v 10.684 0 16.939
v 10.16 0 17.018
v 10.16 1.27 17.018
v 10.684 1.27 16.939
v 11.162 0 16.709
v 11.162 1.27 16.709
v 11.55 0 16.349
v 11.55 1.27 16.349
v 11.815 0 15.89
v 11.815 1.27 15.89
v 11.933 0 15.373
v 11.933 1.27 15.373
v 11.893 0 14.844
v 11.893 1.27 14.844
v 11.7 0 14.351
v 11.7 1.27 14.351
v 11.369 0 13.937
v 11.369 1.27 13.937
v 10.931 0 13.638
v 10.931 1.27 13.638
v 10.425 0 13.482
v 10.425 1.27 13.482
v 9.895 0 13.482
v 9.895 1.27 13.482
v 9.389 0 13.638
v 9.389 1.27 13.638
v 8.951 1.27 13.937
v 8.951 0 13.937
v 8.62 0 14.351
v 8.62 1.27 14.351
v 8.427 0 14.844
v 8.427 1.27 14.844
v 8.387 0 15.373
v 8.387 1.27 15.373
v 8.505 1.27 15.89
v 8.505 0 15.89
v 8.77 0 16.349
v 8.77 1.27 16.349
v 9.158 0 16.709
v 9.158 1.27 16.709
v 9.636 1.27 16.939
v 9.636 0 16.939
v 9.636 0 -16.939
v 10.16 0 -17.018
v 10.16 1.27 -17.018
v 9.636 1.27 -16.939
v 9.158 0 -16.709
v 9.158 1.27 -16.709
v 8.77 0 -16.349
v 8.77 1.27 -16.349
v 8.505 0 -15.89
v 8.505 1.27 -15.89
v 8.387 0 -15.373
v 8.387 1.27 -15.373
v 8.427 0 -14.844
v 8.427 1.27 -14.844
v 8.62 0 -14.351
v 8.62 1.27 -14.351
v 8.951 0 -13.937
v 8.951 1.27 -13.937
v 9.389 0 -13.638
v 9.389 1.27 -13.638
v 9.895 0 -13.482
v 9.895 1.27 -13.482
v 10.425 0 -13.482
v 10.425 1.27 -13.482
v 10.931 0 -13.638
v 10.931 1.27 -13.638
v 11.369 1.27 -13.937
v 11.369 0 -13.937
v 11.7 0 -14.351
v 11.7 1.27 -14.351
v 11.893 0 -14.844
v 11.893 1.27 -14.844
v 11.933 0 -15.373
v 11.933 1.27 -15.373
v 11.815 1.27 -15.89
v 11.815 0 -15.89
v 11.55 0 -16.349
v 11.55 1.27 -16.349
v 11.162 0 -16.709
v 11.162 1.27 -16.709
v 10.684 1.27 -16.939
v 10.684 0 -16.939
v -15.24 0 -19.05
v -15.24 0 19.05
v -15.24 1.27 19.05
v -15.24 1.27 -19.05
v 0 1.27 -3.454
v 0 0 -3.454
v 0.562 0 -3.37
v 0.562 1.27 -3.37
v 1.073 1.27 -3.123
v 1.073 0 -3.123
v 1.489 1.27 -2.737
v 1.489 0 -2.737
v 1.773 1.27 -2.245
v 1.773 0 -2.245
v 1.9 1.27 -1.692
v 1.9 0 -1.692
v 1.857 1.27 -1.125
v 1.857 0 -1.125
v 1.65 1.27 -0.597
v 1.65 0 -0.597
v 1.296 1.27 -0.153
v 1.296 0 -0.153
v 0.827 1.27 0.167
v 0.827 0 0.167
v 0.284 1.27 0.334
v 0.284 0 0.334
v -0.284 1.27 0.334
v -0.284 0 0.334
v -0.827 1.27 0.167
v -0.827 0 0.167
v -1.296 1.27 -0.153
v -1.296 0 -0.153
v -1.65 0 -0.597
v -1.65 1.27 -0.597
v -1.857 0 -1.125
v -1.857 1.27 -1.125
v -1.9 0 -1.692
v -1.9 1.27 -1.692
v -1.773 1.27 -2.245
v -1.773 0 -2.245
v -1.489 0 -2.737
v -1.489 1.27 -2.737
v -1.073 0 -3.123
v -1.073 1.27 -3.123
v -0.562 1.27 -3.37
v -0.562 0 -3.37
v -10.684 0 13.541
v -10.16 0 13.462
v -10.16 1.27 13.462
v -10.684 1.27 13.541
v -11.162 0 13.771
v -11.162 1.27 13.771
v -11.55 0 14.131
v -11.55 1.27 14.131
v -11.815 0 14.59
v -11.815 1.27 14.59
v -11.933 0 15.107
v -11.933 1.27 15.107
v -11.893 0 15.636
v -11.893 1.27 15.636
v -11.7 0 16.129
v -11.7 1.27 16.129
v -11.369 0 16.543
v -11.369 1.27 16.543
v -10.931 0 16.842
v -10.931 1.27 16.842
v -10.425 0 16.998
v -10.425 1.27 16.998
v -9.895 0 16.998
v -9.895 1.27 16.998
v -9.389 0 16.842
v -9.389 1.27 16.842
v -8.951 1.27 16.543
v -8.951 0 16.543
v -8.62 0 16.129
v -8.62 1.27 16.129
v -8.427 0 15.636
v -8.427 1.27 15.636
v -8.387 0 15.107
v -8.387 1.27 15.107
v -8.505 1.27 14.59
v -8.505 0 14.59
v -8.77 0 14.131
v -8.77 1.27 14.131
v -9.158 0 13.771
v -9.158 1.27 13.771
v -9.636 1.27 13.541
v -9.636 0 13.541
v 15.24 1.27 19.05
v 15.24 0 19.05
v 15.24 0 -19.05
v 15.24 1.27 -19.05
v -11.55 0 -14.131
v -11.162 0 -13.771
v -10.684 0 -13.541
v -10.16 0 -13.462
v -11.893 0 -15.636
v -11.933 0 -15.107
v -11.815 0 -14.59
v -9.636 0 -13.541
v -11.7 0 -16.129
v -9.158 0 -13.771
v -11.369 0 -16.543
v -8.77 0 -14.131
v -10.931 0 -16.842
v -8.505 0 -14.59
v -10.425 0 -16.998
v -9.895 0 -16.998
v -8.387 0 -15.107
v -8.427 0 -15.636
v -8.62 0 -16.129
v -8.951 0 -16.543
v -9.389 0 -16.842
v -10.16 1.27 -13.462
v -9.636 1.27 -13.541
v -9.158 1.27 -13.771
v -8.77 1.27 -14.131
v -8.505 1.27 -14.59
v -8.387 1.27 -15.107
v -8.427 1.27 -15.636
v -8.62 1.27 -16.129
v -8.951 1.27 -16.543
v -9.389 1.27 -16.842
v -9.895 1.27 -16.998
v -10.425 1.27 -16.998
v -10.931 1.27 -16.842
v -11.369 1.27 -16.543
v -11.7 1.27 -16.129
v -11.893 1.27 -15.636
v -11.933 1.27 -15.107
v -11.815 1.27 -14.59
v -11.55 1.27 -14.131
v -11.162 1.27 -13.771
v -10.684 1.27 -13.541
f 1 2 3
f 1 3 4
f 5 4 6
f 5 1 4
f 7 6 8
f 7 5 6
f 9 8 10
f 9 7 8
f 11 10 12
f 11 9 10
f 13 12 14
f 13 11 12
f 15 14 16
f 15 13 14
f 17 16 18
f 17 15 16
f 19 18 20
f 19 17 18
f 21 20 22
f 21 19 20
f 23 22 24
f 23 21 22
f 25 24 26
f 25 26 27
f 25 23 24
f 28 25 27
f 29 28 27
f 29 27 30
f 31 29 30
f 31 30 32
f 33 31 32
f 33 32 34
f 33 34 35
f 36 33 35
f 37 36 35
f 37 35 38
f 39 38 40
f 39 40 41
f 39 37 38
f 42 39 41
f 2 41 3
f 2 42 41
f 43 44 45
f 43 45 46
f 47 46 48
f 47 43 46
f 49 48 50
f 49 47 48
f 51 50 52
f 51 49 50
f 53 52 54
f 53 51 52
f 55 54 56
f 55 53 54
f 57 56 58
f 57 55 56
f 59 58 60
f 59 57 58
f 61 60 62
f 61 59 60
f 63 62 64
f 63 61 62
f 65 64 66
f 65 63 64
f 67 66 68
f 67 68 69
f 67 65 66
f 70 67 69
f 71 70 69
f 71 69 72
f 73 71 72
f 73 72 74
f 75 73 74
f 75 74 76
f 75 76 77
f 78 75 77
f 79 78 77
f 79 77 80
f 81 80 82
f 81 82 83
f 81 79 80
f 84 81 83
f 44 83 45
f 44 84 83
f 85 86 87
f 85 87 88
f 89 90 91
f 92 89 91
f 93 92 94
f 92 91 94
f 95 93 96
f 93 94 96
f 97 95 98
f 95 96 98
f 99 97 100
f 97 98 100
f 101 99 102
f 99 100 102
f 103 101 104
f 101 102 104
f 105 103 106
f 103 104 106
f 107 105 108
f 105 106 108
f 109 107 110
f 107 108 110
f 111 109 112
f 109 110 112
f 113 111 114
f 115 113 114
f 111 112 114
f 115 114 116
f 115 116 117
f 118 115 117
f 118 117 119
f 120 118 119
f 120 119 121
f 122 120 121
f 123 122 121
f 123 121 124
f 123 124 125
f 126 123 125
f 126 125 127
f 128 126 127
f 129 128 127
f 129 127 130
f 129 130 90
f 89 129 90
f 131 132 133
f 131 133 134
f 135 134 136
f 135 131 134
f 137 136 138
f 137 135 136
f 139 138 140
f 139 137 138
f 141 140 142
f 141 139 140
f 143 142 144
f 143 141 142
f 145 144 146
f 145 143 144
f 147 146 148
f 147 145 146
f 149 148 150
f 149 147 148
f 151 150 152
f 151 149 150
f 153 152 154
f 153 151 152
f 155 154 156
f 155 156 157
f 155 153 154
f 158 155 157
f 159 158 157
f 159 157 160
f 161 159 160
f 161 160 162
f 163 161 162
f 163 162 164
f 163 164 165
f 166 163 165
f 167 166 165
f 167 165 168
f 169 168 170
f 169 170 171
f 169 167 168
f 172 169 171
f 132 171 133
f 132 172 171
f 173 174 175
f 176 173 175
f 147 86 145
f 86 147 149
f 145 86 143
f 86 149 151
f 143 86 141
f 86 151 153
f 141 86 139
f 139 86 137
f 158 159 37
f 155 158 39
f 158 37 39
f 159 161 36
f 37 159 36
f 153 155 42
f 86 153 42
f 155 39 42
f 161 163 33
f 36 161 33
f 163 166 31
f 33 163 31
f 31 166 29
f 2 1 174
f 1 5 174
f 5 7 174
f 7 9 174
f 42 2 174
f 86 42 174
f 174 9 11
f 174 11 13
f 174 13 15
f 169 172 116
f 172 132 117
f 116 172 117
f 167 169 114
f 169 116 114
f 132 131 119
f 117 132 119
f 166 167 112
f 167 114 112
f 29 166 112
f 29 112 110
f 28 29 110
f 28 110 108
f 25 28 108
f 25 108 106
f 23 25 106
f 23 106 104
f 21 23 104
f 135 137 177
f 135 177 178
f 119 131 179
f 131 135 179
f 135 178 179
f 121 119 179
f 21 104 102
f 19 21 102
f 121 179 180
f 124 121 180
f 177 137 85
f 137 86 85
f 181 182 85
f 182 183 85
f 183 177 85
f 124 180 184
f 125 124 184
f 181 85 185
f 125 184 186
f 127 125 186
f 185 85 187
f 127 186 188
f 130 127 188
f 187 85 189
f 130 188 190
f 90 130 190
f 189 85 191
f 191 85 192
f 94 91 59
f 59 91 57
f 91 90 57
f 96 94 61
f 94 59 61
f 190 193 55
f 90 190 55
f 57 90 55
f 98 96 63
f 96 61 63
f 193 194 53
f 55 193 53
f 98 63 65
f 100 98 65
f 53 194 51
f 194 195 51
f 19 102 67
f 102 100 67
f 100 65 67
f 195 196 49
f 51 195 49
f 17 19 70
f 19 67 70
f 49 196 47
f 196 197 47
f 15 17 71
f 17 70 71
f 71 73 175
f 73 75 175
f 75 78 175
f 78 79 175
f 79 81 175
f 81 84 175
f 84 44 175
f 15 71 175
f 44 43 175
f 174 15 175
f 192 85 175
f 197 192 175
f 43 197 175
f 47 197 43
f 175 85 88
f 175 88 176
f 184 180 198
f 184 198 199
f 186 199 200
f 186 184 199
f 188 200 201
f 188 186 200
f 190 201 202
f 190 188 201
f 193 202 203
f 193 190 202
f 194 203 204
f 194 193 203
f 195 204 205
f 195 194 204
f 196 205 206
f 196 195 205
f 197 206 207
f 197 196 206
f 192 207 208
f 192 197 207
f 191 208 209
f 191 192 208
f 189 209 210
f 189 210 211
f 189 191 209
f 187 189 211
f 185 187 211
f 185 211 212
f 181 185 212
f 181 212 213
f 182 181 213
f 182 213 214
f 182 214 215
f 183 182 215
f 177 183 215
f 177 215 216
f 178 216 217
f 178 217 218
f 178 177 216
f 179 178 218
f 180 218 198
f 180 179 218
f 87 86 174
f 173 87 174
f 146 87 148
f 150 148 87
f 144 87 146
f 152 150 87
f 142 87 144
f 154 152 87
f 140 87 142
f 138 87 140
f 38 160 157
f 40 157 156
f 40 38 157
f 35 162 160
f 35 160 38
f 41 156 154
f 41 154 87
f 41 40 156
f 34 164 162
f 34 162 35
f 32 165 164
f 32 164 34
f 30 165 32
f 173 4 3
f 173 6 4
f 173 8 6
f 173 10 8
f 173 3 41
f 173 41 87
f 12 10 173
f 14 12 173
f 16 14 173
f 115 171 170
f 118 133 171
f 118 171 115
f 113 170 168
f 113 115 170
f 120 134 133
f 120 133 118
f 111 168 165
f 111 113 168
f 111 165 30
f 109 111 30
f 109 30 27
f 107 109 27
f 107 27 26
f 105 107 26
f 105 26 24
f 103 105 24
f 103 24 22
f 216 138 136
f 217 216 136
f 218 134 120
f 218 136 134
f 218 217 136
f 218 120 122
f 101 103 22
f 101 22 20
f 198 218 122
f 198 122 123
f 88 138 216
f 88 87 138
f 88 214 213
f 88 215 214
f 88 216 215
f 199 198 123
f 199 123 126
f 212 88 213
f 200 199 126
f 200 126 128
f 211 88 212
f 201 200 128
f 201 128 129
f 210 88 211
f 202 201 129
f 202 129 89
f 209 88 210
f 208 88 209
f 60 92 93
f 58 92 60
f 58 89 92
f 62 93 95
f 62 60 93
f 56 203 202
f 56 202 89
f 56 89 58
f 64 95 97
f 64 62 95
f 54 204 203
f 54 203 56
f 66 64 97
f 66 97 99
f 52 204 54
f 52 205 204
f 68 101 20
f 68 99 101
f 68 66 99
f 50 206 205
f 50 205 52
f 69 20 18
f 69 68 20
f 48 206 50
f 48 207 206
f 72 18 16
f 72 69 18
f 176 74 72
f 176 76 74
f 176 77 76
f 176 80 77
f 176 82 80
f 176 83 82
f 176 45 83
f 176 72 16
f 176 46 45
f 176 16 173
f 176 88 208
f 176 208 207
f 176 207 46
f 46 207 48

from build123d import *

# Parameters (mm, degrees)
SKETCH1_W           = 30.48
SKETCH1_H           = 38.1
SKETCH1_R           = 1.778
BOSS_EXTRUDE1_DEPTH = 1.27
SKETCH2_R           = 1.778
SKETCH2_R_2         = 1.905
CUT_EXTRUDE1_DEPTH  = 25.428937758


with BuildPart() as part:
    # Sketch1 → Boss-Extrude1 (new body)
    with BuildSketch(Plane(origin=(0, 0, 0), x_dir=(1, 0, 0), z_dir=(0, 1, 0))):
        Rectangle(SKETCH1_W, SKETCH1_H)
        with Locations(Location((-10.16, 15.24, 0), (0, 0, 270))):
            Circle(SKETCH1_R, mode=Mode.SUBTRACT)
        with Locations(Location((10.16, 15.24, 0), (0, 0, 90))):
            Circle(SKETCH1_R, mode=Mode.SUBTRACT)
        with Locations(Location((-10.16, -15.24, 0), (0, 0, 90))):
            Circle(SKETCH1_R, mode=Mode.SUBTRACT)
        with Locations(Location((10.16, -15.24, 0), (0, 0, 270))):
            Circle(SKETCH1_R, mode=Mode.SUBTRACT)
    extrude(amount=BOSS_EXTRUDE1_DEPTH)

    # Sketch2 → Cut-Extrude1 (cut, through all)
    with BuildSketch(Plane.XZ):
        with Locations(Location((-10.16, -15.24, 0), (0, 0, 90))):
            Circle(SKETCH2_R)
        with Locations(Location((10.16, -15.24, 0), (0, 0, 270))):
            Circle(SKETCH2_R)
        with Locations(Location((10.16, 15.24, 0), (0, 0, 90))):
            Circle(SKETCH2_R)
        with Locations(Location((-10.16, 15.24, 0), (0, 0, 270))):
            Circle(SKETCH2_R)
        with Locations(Location((0, -1.5494, 0), (0, 0, 270))):
            Circle(SKETCH2_R_2)
    extrude(amount=-CUT_EXTRUDE1_DEPTH, mode=Mode.SUBTRACT)


solid = part.part
